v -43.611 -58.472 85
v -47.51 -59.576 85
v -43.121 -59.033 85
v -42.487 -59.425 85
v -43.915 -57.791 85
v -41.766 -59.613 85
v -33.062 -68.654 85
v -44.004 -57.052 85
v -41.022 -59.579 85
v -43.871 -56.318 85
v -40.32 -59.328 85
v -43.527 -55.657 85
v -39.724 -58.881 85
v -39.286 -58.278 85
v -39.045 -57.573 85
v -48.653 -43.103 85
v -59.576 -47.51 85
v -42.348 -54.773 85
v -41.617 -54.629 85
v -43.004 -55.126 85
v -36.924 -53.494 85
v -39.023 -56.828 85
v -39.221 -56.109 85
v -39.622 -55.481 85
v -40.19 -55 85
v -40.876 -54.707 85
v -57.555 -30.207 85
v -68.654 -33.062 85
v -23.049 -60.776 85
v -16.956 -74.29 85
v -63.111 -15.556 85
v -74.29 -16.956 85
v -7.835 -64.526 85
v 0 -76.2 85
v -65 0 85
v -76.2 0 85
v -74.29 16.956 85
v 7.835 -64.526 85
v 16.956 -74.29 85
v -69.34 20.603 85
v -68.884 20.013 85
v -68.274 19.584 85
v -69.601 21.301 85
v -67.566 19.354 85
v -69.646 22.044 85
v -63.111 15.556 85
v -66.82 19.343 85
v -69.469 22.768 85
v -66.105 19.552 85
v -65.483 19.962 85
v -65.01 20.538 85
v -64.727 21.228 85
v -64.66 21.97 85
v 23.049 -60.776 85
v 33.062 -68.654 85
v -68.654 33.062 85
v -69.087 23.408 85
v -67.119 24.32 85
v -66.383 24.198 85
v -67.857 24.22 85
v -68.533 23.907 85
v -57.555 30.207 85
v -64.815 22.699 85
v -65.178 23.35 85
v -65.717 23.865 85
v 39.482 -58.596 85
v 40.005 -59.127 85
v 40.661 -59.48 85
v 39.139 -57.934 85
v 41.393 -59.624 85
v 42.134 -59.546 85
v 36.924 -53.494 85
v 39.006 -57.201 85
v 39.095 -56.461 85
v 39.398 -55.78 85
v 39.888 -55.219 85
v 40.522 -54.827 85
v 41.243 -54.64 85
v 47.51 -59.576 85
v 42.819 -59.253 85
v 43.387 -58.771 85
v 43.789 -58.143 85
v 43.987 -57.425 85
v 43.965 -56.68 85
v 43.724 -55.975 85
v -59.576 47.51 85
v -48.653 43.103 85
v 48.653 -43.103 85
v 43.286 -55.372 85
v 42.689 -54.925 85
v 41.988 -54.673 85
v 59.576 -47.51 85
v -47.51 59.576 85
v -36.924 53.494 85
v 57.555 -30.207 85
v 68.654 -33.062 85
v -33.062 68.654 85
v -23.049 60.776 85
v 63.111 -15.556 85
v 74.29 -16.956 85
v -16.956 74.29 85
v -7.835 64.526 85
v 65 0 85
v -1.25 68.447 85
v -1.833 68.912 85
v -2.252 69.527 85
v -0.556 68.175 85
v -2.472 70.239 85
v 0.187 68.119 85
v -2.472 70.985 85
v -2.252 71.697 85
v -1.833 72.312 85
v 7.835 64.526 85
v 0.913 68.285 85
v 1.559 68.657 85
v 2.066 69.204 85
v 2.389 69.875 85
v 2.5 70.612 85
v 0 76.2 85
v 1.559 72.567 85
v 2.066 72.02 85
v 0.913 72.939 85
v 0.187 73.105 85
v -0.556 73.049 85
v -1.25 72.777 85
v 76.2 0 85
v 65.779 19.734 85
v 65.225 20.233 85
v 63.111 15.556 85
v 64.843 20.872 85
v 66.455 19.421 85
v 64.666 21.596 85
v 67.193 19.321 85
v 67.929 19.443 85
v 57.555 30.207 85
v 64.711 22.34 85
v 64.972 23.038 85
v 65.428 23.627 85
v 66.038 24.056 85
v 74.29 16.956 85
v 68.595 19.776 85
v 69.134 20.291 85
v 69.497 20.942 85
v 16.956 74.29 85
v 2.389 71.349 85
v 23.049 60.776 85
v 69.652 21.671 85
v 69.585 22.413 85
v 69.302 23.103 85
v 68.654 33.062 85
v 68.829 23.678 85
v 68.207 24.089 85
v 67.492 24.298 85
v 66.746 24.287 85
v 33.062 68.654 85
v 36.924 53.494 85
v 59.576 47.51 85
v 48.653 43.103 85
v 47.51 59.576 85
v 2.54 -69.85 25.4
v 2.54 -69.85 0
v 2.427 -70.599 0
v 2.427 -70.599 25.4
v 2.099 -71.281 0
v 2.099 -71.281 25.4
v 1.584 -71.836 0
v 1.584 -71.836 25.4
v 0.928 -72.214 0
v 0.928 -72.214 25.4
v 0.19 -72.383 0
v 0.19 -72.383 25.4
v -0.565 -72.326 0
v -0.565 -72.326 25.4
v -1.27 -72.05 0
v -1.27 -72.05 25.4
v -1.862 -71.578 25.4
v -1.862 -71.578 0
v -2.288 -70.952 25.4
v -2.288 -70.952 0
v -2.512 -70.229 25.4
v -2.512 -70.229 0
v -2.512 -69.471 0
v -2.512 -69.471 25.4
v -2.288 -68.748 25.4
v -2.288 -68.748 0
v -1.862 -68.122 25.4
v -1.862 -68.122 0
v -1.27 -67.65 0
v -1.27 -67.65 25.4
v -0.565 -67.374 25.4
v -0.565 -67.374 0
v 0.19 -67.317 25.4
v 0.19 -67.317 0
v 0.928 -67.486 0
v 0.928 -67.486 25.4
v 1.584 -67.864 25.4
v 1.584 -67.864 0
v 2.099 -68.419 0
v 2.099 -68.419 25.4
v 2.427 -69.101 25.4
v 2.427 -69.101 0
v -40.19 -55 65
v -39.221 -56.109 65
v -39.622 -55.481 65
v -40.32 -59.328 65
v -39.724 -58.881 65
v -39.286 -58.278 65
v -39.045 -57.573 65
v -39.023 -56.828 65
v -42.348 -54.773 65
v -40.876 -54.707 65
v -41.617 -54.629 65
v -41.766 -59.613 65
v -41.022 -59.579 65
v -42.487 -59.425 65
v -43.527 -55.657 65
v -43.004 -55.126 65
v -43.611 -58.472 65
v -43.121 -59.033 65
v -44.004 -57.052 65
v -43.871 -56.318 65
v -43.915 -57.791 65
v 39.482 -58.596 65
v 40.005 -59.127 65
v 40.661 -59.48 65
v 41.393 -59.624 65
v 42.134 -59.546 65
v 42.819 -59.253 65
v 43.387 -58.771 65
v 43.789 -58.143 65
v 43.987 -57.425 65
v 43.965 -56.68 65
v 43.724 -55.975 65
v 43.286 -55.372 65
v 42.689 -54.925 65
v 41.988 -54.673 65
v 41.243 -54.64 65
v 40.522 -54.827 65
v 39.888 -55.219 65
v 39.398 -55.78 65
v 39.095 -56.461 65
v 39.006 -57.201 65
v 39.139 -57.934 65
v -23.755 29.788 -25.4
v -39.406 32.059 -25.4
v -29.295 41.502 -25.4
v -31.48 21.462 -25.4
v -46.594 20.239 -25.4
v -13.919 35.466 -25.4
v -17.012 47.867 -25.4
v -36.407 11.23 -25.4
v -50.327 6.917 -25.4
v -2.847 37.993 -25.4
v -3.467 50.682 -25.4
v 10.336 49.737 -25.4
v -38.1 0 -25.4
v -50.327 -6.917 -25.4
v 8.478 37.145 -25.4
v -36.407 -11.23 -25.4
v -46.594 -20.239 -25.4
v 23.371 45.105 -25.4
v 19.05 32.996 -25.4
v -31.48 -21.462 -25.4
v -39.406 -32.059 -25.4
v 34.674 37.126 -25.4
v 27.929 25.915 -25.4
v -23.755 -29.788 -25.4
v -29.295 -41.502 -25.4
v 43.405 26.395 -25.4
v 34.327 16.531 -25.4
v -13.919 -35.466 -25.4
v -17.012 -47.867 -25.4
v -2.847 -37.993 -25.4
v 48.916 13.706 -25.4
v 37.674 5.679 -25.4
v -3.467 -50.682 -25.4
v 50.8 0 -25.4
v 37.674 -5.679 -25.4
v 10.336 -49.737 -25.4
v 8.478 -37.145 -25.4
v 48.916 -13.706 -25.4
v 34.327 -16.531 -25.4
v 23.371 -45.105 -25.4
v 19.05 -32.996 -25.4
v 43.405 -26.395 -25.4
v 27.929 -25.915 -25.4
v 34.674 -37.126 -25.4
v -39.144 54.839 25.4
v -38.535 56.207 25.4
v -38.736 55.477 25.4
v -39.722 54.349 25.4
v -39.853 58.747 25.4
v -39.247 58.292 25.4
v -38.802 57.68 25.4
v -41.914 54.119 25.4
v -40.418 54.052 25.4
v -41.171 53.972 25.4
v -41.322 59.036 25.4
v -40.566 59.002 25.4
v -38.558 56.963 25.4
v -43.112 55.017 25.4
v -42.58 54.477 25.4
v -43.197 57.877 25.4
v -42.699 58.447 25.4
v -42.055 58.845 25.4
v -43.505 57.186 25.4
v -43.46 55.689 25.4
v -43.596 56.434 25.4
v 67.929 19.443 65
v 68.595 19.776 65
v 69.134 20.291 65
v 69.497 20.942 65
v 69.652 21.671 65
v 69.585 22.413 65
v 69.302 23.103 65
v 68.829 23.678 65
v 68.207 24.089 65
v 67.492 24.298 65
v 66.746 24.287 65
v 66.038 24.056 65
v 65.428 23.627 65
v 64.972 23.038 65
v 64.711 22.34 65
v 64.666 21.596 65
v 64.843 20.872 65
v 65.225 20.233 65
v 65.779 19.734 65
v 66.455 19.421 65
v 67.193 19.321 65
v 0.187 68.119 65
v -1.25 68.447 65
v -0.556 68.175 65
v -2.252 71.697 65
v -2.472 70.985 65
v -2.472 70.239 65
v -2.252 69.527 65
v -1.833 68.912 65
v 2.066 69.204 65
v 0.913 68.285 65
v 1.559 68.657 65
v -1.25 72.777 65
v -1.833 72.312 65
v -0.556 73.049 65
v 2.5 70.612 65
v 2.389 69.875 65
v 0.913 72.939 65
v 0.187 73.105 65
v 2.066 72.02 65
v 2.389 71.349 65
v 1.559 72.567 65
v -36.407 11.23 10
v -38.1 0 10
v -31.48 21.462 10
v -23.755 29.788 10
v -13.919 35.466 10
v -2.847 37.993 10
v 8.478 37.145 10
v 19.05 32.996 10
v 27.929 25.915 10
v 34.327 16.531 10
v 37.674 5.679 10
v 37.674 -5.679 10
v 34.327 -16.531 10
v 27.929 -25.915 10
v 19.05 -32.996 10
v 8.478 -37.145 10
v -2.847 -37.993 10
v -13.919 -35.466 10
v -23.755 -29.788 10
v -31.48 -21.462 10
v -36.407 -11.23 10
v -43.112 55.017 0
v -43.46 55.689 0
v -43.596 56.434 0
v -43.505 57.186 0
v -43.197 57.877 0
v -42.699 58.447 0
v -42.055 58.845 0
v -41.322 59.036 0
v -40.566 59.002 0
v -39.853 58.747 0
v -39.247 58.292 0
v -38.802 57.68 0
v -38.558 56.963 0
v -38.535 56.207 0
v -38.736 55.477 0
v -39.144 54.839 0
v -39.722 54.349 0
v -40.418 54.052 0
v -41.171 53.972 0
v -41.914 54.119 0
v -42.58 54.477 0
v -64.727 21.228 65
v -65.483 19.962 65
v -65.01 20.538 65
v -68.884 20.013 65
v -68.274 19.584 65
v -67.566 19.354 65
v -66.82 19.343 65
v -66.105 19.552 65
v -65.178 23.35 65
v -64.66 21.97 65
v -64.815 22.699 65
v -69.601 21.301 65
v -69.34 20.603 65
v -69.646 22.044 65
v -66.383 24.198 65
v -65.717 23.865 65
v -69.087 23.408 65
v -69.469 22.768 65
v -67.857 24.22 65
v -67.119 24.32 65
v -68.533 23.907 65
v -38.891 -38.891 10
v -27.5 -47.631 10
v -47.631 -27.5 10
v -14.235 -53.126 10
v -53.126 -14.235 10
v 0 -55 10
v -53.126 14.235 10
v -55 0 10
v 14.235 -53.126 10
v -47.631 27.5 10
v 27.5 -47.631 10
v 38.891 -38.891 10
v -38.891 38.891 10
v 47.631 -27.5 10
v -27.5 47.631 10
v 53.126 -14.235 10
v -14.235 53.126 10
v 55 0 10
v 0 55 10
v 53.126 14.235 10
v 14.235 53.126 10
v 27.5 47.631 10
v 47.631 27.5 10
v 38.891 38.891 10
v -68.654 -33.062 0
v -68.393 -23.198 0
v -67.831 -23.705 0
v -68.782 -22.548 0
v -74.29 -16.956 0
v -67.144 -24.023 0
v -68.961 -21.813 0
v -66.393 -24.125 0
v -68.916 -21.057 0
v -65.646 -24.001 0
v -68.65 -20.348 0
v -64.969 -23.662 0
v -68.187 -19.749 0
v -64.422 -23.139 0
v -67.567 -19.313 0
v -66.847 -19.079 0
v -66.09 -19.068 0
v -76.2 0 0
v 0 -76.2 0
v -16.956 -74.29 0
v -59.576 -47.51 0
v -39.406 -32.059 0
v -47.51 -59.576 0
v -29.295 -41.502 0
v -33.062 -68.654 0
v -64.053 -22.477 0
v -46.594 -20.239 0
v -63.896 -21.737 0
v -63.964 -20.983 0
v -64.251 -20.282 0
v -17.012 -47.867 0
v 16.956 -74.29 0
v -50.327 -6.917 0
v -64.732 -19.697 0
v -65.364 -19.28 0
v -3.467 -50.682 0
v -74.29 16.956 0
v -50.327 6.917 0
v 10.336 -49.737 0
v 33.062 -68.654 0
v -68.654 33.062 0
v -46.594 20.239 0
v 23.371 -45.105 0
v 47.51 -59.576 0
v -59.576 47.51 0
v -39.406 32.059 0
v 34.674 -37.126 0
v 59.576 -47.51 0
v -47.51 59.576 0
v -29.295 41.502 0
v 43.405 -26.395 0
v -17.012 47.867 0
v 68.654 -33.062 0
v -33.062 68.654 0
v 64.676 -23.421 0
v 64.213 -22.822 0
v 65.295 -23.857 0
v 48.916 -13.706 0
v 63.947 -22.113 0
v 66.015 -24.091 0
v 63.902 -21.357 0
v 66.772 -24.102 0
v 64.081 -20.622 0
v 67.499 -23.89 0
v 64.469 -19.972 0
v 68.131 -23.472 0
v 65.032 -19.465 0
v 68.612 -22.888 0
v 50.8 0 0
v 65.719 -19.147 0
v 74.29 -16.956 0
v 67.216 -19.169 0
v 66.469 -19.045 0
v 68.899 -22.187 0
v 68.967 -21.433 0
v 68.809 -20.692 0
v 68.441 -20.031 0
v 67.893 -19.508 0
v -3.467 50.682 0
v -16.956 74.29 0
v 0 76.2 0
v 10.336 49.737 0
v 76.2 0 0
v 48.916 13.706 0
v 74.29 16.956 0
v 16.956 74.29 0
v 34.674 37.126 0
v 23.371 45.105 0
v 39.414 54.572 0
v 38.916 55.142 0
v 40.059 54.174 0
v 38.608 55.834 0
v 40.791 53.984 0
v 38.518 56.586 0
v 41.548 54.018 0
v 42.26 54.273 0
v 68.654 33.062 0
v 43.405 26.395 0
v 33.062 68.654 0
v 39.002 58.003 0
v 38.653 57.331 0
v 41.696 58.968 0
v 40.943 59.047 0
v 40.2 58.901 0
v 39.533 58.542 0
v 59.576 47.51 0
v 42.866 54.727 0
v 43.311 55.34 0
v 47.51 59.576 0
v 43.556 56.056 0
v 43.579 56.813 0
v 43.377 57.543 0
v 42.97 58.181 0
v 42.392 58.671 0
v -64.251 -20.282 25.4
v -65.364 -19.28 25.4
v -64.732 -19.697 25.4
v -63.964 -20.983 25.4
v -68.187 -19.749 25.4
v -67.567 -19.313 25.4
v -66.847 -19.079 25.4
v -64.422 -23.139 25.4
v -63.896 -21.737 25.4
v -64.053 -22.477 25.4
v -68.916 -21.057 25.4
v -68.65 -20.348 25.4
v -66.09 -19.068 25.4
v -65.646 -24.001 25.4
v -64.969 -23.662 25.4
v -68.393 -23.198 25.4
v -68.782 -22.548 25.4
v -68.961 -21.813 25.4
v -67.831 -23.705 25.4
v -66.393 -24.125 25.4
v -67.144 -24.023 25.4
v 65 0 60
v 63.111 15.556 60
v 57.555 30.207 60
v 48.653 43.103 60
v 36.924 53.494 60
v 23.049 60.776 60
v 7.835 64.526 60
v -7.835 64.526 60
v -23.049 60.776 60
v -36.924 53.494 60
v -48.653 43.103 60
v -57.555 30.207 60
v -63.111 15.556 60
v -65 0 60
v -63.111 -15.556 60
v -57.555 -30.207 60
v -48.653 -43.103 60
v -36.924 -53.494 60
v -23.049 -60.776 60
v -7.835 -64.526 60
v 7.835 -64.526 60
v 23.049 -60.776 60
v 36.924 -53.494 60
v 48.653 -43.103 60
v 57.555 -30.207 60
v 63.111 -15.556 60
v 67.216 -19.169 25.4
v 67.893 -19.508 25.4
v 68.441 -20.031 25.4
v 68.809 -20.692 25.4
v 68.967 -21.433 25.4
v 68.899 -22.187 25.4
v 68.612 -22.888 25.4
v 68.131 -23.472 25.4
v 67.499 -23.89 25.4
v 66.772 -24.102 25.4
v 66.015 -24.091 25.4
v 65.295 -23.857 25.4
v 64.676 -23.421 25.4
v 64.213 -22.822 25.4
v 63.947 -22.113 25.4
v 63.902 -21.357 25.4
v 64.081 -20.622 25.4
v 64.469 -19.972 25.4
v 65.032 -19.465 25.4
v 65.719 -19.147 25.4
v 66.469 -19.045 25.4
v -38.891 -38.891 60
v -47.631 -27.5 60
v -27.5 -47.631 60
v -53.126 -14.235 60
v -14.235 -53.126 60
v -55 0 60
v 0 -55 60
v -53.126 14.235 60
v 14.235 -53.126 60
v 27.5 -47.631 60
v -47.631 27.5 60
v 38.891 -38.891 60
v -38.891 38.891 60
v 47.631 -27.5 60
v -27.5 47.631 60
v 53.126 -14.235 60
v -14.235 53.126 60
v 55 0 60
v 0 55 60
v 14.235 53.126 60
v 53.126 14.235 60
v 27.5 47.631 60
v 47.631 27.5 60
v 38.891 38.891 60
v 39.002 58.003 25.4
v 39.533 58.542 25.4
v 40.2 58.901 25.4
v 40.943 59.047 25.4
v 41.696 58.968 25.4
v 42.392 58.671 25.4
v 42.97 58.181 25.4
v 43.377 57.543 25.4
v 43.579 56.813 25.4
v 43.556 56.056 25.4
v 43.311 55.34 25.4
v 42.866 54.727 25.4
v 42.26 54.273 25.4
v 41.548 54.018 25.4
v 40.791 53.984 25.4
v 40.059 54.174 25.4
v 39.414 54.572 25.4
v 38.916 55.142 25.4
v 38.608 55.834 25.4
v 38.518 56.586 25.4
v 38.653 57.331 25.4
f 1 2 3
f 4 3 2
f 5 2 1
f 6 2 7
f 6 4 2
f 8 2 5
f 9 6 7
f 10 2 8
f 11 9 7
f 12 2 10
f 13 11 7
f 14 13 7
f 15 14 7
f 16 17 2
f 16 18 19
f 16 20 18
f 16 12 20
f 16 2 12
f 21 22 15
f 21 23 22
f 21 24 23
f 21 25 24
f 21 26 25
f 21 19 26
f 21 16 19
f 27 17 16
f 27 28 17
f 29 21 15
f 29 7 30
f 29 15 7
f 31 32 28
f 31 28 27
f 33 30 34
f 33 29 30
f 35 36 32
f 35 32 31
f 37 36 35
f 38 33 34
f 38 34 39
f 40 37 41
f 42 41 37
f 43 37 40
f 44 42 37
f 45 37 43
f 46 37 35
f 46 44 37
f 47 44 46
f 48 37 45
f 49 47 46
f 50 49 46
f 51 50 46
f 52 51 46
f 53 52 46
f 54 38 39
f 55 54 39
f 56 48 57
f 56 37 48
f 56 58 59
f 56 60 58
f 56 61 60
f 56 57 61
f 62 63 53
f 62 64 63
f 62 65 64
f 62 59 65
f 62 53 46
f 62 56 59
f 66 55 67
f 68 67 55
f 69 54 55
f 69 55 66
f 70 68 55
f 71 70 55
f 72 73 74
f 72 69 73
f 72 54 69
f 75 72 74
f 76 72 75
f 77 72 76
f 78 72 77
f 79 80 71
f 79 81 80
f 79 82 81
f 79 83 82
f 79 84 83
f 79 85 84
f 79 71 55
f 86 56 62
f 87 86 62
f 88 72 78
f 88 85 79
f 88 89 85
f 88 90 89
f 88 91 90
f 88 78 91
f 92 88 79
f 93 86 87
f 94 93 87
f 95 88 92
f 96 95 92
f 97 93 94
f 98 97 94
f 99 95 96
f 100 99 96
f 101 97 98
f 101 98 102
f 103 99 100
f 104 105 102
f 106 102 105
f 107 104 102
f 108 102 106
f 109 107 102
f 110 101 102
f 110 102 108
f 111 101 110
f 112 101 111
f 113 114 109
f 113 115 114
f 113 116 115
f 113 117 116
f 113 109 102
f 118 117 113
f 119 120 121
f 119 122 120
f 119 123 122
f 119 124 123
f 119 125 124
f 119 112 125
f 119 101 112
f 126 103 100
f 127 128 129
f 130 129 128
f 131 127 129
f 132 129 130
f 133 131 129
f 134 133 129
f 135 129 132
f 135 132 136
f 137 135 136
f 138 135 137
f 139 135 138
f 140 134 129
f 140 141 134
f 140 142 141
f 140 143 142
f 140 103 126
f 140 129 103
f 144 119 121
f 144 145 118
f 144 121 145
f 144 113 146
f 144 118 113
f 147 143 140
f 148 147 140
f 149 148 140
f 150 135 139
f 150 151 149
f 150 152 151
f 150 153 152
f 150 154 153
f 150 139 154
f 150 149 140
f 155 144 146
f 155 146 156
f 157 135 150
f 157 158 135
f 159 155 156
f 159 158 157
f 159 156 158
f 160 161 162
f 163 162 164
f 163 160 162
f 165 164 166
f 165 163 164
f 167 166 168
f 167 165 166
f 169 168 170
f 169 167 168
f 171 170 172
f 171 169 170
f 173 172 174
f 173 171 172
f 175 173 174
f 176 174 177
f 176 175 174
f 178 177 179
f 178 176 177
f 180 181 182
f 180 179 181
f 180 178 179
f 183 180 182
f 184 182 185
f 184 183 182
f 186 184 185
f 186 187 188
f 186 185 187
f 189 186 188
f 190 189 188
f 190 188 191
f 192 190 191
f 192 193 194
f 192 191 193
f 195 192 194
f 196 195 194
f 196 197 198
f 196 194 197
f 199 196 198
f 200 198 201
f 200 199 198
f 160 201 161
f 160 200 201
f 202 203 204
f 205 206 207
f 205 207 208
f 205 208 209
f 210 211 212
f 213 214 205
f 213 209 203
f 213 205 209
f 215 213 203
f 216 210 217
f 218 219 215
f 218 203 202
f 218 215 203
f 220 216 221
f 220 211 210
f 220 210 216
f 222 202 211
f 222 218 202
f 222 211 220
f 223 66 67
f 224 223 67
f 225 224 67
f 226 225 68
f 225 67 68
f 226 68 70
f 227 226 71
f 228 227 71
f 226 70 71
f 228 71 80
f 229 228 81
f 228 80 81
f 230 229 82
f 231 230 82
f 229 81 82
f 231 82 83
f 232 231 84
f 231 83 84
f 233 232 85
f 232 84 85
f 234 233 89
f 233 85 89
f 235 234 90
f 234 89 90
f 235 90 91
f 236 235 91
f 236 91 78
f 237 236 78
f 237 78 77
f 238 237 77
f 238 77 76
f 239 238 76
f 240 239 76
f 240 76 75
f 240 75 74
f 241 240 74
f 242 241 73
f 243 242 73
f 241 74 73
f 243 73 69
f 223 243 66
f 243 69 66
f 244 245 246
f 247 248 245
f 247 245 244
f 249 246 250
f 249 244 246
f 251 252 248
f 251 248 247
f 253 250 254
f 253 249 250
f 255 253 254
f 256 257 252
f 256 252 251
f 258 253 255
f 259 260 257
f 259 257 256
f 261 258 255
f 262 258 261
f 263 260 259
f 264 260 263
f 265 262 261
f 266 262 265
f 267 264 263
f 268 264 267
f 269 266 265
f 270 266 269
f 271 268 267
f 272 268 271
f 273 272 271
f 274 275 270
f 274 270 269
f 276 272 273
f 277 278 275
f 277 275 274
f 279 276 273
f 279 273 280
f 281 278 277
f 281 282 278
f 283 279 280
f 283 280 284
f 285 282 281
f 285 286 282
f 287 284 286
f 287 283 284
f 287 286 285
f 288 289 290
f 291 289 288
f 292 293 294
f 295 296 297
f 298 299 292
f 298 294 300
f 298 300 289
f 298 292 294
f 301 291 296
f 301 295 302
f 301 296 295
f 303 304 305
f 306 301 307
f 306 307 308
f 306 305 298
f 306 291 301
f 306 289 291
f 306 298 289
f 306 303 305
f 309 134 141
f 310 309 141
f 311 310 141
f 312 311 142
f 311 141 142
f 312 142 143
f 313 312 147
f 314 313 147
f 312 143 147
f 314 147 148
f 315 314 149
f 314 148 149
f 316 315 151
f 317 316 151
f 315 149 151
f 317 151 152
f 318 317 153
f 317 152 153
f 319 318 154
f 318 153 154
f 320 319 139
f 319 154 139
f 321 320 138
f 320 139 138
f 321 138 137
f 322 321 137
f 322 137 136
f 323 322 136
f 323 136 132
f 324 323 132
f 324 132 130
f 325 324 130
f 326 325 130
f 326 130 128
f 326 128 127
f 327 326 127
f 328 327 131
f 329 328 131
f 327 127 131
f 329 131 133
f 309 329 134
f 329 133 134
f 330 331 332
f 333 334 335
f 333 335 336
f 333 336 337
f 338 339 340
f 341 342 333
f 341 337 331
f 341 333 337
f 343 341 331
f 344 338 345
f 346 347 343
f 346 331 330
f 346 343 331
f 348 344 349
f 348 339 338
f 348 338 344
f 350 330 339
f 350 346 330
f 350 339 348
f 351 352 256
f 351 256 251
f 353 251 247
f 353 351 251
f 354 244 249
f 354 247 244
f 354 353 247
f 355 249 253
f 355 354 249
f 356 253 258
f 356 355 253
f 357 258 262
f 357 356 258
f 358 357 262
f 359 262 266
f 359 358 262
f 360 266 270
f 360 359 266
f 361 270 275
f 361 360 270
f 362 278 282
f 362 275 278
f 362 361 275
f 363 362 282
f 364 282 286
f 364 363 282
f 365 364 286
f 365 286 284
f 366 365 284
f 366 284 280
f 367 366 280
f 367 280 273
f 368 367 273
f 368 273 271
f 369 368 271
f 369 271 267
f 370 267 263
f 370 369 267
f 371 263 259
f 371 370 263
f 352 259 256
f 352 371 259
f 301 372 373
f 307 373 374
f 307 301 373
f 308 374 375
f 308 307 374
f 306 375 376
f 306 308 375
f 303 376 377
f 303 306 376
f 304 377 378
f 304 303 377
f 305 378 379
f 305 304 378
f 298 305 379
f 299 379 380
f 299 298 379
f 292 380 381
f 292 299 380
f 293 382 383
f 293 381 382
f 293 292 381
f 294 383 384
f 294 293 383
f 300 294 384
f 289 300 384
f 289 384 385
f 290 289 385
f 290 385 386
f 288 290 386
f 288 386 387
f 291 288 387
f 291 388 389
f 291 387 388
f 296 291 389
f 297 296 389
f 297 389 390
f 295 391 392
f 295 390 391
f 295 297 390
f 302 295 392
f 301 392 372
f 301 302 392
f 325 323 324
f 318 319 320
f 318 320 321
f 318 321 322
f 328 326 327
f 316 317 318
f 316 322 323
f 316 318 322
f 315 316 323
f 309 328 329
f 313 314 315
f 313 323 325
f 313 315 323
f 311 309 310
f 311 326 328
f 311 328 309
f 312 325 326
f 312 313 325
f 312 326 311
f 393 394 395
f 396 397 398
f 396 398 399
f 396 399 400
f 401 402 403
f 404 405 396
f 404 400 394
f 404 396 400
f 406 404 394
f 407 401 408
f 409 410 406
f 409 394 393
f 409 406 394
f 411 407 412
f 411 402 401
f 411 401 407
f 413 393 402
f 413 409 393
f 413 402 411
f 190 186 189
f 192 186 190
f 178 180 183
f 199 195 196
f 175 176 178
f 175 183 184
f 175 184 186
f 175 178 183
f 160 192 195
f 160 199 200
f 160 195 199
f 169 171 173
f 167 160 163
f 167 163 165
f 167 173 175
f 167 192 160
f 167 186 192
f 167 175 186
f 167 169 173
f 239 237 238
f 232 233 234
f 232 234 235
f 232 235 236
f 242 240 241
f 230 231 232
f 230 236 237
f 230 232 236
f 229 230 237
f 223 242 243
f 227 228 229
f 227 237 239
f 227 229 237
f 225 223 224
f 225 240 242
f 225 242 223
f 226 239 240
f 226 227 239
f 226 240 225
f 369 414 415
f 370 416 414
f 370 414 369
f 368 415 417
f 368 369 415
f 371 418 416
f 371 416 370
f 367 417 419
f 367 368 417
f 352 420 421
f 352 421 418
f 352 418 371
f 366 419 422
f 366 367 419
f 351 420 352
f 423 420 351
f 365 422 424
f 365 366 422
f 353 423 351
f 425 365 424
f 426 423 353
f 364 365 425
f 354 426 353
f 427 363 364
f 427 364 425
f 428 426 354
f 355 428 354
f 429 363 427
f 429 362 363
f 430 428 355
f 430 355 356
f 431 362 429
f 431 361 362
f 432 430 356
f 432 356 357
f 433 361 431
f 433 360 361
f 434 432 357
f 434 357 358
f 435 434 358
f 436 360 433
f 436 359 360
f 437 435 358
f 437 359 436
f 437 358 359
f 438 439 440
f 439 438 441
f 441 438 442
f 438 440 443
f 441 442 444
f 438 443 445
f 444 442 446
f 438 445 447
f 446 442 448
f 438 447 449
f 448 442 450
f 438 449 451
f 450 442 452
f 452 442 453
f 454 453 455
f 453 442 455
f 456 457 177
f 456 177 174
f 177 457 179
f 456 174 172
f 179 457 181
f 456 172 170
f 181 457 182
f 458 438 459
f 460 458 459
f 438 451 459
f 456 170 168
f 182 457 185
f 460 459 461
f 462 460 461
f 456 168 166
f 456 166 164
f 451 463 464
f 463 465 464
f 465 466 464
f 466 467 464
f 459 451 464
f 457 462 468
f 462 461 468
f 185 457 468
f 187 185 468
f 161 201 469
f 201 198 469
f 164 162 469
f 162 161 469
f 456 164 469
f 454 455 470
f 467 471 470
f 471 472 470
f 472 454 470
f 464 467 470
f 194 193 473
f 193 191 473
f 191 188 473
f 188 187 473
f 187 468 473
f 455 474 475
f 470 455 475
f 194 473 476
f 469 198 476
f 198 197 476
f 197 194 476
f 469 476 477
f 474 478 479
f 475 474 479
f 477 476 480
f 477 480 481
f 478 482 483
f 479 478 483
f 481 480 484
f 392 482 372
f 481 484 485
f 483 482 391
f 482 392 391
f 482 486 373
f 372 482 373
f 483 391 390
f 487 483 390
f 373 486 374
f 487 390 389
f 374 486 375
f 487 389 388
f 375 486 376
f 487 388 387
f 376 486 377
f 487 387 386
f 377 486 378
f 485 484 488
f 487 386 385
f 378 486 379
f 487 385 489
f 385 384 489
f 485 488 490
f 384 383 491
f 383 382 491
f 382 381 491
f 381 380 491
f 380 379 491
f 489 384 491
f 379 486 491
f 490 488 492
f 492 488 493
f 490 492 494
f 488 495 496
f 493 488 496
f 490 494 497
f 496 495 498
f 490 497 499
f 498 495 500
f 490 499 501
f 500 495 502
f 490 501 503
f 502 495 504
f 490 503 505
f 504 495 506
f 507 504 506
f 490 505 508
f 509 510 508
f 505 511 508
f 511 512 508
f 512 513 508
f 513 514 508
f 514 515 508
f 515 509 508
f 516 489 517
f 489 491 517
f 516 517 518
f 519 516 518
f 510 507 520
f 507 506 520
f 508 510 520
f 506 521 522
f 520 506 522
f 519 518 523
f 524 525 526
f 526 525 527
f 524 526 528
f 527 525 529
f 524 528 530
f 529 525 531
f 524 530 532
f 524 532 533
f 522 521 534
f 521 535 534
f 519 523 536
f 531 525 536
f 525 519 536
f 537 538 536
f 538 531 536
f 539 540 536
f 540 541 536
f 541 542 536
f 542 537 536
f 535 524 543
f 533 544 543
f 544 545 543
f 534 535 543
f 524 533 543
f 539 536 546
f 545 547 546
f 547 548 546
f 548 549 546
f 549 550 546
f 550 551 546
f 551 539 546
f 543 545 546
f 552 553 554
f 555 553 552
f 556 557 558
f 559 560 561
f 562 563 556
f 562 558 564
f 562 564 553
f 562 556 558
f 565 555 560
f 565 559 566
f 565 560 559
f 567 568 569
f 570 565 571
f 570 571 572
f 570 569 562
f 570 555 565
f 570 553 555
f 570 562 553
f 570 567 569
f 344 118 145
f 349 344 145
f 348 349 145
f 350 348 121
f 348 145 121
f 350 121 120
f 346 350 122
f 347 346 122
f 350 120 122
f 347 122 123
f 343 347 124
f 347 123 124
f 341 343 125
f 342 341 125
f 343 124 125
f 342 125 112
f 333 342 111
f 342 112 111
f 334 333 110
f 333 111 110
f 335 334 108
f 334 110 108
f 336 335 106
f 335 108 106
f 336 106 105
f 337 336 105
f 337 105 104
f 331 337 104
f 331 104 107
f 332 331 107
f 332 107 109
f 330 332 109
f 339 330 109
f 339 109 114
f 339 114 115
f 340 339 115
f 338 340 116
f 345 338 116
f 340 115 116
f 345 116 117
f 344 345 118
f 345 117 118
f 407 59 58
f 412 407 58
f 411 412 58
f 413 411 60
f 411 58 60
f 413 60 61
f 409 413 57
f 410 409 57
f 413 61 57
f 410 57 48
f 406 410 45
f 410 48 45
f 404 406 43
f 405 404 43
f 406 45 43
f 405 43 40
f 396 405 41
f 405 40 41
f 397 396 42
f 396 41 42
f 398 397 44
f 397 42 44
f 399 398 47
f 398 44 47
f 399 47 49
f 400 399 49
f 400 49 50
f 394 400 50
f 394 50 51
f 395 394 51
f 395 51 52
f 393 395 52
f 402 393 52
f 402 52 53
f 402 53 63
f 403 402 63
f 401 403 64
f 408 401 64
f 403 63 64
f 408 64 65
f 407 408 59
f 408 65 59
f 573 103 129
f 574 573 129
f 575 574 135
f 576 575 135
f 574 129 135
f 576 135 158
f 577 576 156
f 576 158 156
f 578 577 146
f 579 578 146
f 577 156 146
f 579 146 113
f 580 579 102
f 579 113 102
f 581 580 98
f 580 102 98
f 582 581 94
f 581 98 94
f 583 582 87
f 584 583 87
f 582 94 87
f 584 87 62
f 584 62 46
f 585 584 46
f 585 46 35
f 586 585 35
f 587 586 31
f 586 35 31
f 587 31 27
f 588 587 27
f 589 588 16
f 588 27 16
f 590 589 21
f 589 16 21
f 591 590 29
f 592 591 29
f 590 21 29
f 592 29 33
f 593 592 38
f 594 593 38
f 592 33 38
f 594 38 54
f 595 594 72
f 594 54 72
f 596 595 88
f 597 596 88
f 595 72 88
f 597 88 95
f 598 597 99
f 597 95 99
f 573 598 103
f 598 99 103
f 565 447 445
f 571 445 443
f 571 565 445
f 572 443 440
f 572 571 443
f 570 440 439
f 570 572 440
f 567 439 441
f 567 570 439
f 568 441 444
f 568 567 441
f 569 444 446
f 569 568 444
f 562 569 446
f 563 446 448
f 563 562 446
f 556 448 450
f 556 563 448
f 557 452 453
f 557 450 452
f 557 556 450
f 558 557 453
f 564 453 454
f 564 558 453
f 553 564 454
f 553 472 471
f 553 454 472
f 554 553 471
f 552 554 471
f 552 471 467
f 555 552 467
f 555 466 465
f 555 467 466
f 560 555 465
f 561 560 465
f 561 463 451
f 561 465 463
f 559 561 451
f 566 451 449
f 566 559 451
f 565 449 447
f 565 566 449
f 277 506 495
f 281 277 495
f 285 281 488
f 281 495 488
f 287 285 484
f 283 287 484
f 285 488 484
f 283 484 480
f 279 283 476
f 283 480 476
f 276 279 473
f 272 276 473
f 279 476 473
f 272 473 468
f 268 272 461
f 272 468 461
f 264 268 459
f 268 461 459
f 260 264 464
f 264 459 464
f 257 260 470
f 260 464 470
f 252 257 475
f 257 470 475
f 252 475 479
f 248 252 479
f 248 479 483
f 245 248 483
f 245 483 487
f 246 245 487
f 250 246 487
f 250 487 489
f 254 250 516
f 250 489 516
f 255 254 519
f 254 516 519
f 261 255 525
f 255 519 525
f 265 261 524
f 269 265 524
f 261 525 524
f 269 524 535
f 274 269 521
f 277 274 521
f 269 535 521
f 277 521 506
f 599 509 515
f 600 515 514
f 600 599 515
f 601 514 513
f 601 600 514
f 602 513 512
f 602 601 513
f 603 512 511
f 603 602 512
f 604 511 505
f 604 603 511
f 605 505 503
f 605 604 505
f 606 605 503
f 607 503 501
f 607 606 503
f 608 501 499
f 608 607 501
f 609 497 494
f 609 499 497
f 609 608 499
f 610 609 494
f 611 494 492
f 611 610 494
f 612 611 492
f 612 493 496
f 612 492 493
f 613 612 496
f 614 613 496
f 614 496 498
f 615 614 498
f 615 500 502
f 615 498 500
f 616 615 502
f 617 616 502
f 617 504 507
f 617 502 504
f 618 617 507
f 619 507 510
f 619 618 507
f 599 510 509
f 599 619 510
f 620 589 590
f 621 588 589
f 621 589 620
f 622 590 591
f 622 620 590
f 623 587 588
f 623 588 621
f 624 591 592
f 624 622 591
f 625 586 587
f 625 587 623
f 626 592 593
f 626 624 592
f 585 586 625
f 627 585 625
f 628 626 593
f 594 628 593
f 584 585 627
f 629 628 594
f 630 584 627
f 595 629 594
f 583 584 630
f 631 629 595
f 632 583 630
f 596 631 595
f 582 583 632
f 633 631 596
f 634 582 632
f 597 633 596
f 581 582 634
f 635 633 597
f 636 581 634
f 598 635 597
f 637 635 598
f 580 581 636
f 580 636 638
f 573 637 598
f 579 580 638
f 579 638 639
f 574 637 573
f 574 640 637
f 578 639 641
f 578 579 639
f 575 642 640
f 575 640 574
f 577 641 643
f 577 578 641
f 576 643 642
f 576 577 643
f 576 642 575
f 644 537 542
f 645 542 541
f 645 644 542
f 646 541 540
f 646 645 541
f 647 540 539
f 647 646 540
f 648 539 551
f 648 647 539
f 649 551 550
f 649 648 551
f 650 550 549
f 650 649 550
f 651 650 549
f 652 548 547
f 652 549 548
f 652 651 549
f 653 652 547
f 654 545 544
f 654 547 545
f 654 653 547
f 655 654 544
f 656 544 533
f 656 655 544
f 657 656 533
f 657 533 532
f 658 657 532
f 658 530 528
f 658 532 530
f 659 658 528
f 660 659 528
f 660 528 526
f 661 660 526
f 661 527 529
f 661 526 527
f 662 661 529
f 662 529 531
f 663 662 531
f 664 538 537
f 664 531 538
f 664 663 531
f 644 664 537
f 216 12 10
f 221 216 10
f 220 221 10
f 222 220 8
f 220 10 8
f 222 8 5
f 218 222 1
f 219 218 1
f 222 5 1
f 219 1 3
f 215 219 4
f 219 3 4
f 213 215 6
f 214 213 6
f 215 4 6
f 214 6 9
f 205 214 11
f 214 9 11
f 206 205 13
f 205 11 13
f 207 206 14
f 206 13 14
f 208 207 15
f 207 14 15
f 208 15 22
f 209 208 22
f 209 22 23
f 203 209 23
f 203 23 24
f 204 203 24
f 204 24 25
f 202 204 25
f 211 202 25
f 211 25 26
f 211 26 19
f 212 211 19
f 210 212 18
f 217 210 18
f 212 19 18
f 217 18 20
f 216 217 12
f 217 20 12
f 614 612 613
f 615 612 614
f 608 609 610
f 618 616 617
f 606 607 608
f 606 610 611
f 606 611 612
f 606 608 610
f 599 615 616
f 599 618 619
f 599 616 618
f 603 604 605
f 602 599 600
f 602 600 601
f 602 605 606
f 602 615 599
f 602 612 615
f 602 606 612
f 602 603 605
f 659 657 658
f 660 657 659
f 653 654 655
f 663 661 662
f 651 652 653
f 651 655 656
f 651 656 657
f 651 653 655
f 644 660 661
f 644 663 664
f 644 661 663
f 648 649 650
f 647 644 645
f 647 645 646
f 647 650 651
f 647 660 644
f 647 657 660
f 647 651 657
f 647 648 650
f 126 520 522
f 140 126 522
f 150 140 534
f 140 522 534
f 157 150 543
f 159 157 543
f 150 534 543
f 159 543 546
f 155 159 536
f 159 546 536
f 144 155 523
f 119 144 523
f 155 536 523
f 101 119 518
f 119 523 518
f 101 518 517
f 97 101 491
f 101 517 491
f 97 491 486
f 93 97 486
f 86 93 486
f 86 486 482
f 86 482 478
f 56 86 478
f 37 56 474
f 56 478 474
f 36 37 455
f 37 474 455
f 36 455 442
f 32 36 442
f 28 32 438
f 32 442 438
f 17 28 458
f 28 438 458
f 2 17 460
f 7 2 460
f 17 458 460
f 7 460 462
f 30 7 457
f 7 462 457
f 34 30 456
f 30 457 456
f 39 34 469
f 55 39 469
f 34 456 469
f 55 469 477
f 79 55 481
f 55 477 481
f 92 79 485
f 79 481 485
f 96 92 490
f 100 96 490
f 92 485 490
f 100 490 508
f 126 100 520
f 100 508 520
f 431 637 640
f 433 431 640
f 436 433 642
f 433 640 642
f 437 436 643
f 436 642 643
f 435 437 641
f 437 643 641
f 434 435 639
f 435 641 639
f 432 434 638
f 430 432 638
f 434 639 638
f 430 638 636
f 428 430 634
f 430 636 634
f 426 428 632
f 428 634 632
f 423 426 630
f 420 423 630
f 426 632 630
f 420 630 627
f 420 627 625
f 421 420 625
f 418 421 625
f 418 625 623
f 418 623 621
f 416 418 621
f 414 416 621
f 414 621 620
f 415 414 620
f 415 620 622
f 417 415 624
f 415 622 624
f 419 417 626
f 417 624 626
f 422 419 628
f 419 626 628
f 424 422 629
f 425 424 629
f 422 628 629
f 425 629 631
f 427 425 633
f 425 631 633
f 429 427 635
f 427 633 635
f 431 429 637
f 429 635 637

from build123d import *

# Parameters (mm, degrees)
SKETCH2_R               = 76.2
BOSS_EXTRUDE1_DEPTH     = 85
SKETCH4_R               = 65
CUT_EXTRUDE2_DEPTH      = 25
SKETCH5_R               = 55
CUT_EXTRUDE3_DEPTH      = 50
SKETCH7_R               = 2.5
CUT_EXTRUDE4_DEPTH      = 20
CIRPATTERN1_COUNT       = 5
SKETCH8_R               = 50.8
BOSS_EXTRUDE3_DEPTH     = 25.4
CUT_EXTRUDE5_DEPTH      = 155.275856828
CUT_EXTRUDE5_DEPTH_BACK = 155.275856828
SKETCH10_R              = 38.1
CUT_EXTRUDE6_START      = -25.4
SKETCH11_R              = 2.54
CUT_EXTRUDE6_DEPTH      = 163.651156644
CIRPATTERN2_COUNT       = 5


with BuildPart() as part:
    # Sketch2 → Boss-Extrude1 (new body)
    with BuildSketch(Plane(origin=(0, 0, 0), x_dir=(0, 1, 0), z_dir=(0, 0, 1))):
        with Locations(Location((0, 0, 0), (0, 0, 270))):
            Circle(SKETCH2_R)
    extrude(amount=BOSS_EXTRUDE1_DEPTH)

    # Sketch4 → Cut-Extrude2 (cut)
    with BuildSketch(Plane.XY.offset(85)):
        Circle(SKETCH4_R)
    extrude(amount=-CUT_EXTRUDE2_DEPTH, mode=Mode.SUBTRACT)

    # Sketch5 → Cut-Extrude3 (cut)
    with BuildSketch(Plane.XY.offset(60)):
        Circle(SKETCH5_R)
    extrude(amount=-CUT_EXTRUDE3_DEPTH, mode=Mode.SUBTRACT)

    # Sketch7 → Cut-Extrude4 (cut)
    with BuildSketch(Plane.XY.offset(85)):
        with Locations((0, 70.612)):
            Circle(SKETCH7_R)
    cut_extrude4 = extrude(amount=-CUT_EXTRUDE4_DEPTH, mode=Mode.SUBTRACT)

    # CirPattern1: Cut-Extrude4 ×5 about axis
    cirpattern1_axis = Axis((0, 0, 0), (0, 0, 1))
    for i in range(1, CIRPATTERN1_COUNT):
        add(cut_extrude4.rotate(cirpattern1_axis, i * 360 / CIRPATTERN1_COUNT), mode=Mode.SUBTRACT)

    # Sketch8 → Boss-Extrude3 (add)
    with BuildSketch(Plane(origin=(0, 0, 0), x_dir=(1, 0, 0), z_dir=(0, 0, -1))):
        Circle(SKETCH8_R)
    extrude(amount=BOSS_EXTRUDE3_DEPTH)

    # Sketch10 → Cut-Extrude5 (cut, two sides: drawn at the far end of the back side and taken through both)
    with BuildSketch(Plane(origin=(0, 0, -25.4), x_dir=(1, 0, 0), z_dir=(0, 0, -1)).offset(-CUT_EXTRUDE5_DEPTH_BACK)):
        with Locations(Location((0, 0, 0), (0, 0, 180))):
            Circle(SKETCH10_R)
    extrude(amount=CUT_EXTRUDE5_DEPTH + CUT_EXTRUDE5_DEPTH_BACK, mode=Mode.SUBTRACT)

    # Sketch11 → Cut-Extrude6 (cut)
    with BuildSketch(Plane(origin=(0, 0, 0), x_dir=(1, 0, 0), z_dir=(0, 0, -1)).offset(CUT_EXTRUDE6_START)):
        with Locations((0, 69.85)):
            Circle(SKETCH11_R)
    cut_extrude6 = extrude(amount=CUT_EXTRUDE6_DEPTH, mode=Mode.SUBTRACT)

    # CirPattern2: Cut-Extrude6 ×5 about axis
    cirpattern2_axis = Axis((0, 0, 0), (0, 0, 1))
    for i in range(1, CIRPATTERN2_COUNT):
        add(cut_extrude6.rotate(cirpattern2_axis, i * 360 / CIRPATTERN2_COUNT), mode=Mode.SUBTRACT)


solid = part.part
